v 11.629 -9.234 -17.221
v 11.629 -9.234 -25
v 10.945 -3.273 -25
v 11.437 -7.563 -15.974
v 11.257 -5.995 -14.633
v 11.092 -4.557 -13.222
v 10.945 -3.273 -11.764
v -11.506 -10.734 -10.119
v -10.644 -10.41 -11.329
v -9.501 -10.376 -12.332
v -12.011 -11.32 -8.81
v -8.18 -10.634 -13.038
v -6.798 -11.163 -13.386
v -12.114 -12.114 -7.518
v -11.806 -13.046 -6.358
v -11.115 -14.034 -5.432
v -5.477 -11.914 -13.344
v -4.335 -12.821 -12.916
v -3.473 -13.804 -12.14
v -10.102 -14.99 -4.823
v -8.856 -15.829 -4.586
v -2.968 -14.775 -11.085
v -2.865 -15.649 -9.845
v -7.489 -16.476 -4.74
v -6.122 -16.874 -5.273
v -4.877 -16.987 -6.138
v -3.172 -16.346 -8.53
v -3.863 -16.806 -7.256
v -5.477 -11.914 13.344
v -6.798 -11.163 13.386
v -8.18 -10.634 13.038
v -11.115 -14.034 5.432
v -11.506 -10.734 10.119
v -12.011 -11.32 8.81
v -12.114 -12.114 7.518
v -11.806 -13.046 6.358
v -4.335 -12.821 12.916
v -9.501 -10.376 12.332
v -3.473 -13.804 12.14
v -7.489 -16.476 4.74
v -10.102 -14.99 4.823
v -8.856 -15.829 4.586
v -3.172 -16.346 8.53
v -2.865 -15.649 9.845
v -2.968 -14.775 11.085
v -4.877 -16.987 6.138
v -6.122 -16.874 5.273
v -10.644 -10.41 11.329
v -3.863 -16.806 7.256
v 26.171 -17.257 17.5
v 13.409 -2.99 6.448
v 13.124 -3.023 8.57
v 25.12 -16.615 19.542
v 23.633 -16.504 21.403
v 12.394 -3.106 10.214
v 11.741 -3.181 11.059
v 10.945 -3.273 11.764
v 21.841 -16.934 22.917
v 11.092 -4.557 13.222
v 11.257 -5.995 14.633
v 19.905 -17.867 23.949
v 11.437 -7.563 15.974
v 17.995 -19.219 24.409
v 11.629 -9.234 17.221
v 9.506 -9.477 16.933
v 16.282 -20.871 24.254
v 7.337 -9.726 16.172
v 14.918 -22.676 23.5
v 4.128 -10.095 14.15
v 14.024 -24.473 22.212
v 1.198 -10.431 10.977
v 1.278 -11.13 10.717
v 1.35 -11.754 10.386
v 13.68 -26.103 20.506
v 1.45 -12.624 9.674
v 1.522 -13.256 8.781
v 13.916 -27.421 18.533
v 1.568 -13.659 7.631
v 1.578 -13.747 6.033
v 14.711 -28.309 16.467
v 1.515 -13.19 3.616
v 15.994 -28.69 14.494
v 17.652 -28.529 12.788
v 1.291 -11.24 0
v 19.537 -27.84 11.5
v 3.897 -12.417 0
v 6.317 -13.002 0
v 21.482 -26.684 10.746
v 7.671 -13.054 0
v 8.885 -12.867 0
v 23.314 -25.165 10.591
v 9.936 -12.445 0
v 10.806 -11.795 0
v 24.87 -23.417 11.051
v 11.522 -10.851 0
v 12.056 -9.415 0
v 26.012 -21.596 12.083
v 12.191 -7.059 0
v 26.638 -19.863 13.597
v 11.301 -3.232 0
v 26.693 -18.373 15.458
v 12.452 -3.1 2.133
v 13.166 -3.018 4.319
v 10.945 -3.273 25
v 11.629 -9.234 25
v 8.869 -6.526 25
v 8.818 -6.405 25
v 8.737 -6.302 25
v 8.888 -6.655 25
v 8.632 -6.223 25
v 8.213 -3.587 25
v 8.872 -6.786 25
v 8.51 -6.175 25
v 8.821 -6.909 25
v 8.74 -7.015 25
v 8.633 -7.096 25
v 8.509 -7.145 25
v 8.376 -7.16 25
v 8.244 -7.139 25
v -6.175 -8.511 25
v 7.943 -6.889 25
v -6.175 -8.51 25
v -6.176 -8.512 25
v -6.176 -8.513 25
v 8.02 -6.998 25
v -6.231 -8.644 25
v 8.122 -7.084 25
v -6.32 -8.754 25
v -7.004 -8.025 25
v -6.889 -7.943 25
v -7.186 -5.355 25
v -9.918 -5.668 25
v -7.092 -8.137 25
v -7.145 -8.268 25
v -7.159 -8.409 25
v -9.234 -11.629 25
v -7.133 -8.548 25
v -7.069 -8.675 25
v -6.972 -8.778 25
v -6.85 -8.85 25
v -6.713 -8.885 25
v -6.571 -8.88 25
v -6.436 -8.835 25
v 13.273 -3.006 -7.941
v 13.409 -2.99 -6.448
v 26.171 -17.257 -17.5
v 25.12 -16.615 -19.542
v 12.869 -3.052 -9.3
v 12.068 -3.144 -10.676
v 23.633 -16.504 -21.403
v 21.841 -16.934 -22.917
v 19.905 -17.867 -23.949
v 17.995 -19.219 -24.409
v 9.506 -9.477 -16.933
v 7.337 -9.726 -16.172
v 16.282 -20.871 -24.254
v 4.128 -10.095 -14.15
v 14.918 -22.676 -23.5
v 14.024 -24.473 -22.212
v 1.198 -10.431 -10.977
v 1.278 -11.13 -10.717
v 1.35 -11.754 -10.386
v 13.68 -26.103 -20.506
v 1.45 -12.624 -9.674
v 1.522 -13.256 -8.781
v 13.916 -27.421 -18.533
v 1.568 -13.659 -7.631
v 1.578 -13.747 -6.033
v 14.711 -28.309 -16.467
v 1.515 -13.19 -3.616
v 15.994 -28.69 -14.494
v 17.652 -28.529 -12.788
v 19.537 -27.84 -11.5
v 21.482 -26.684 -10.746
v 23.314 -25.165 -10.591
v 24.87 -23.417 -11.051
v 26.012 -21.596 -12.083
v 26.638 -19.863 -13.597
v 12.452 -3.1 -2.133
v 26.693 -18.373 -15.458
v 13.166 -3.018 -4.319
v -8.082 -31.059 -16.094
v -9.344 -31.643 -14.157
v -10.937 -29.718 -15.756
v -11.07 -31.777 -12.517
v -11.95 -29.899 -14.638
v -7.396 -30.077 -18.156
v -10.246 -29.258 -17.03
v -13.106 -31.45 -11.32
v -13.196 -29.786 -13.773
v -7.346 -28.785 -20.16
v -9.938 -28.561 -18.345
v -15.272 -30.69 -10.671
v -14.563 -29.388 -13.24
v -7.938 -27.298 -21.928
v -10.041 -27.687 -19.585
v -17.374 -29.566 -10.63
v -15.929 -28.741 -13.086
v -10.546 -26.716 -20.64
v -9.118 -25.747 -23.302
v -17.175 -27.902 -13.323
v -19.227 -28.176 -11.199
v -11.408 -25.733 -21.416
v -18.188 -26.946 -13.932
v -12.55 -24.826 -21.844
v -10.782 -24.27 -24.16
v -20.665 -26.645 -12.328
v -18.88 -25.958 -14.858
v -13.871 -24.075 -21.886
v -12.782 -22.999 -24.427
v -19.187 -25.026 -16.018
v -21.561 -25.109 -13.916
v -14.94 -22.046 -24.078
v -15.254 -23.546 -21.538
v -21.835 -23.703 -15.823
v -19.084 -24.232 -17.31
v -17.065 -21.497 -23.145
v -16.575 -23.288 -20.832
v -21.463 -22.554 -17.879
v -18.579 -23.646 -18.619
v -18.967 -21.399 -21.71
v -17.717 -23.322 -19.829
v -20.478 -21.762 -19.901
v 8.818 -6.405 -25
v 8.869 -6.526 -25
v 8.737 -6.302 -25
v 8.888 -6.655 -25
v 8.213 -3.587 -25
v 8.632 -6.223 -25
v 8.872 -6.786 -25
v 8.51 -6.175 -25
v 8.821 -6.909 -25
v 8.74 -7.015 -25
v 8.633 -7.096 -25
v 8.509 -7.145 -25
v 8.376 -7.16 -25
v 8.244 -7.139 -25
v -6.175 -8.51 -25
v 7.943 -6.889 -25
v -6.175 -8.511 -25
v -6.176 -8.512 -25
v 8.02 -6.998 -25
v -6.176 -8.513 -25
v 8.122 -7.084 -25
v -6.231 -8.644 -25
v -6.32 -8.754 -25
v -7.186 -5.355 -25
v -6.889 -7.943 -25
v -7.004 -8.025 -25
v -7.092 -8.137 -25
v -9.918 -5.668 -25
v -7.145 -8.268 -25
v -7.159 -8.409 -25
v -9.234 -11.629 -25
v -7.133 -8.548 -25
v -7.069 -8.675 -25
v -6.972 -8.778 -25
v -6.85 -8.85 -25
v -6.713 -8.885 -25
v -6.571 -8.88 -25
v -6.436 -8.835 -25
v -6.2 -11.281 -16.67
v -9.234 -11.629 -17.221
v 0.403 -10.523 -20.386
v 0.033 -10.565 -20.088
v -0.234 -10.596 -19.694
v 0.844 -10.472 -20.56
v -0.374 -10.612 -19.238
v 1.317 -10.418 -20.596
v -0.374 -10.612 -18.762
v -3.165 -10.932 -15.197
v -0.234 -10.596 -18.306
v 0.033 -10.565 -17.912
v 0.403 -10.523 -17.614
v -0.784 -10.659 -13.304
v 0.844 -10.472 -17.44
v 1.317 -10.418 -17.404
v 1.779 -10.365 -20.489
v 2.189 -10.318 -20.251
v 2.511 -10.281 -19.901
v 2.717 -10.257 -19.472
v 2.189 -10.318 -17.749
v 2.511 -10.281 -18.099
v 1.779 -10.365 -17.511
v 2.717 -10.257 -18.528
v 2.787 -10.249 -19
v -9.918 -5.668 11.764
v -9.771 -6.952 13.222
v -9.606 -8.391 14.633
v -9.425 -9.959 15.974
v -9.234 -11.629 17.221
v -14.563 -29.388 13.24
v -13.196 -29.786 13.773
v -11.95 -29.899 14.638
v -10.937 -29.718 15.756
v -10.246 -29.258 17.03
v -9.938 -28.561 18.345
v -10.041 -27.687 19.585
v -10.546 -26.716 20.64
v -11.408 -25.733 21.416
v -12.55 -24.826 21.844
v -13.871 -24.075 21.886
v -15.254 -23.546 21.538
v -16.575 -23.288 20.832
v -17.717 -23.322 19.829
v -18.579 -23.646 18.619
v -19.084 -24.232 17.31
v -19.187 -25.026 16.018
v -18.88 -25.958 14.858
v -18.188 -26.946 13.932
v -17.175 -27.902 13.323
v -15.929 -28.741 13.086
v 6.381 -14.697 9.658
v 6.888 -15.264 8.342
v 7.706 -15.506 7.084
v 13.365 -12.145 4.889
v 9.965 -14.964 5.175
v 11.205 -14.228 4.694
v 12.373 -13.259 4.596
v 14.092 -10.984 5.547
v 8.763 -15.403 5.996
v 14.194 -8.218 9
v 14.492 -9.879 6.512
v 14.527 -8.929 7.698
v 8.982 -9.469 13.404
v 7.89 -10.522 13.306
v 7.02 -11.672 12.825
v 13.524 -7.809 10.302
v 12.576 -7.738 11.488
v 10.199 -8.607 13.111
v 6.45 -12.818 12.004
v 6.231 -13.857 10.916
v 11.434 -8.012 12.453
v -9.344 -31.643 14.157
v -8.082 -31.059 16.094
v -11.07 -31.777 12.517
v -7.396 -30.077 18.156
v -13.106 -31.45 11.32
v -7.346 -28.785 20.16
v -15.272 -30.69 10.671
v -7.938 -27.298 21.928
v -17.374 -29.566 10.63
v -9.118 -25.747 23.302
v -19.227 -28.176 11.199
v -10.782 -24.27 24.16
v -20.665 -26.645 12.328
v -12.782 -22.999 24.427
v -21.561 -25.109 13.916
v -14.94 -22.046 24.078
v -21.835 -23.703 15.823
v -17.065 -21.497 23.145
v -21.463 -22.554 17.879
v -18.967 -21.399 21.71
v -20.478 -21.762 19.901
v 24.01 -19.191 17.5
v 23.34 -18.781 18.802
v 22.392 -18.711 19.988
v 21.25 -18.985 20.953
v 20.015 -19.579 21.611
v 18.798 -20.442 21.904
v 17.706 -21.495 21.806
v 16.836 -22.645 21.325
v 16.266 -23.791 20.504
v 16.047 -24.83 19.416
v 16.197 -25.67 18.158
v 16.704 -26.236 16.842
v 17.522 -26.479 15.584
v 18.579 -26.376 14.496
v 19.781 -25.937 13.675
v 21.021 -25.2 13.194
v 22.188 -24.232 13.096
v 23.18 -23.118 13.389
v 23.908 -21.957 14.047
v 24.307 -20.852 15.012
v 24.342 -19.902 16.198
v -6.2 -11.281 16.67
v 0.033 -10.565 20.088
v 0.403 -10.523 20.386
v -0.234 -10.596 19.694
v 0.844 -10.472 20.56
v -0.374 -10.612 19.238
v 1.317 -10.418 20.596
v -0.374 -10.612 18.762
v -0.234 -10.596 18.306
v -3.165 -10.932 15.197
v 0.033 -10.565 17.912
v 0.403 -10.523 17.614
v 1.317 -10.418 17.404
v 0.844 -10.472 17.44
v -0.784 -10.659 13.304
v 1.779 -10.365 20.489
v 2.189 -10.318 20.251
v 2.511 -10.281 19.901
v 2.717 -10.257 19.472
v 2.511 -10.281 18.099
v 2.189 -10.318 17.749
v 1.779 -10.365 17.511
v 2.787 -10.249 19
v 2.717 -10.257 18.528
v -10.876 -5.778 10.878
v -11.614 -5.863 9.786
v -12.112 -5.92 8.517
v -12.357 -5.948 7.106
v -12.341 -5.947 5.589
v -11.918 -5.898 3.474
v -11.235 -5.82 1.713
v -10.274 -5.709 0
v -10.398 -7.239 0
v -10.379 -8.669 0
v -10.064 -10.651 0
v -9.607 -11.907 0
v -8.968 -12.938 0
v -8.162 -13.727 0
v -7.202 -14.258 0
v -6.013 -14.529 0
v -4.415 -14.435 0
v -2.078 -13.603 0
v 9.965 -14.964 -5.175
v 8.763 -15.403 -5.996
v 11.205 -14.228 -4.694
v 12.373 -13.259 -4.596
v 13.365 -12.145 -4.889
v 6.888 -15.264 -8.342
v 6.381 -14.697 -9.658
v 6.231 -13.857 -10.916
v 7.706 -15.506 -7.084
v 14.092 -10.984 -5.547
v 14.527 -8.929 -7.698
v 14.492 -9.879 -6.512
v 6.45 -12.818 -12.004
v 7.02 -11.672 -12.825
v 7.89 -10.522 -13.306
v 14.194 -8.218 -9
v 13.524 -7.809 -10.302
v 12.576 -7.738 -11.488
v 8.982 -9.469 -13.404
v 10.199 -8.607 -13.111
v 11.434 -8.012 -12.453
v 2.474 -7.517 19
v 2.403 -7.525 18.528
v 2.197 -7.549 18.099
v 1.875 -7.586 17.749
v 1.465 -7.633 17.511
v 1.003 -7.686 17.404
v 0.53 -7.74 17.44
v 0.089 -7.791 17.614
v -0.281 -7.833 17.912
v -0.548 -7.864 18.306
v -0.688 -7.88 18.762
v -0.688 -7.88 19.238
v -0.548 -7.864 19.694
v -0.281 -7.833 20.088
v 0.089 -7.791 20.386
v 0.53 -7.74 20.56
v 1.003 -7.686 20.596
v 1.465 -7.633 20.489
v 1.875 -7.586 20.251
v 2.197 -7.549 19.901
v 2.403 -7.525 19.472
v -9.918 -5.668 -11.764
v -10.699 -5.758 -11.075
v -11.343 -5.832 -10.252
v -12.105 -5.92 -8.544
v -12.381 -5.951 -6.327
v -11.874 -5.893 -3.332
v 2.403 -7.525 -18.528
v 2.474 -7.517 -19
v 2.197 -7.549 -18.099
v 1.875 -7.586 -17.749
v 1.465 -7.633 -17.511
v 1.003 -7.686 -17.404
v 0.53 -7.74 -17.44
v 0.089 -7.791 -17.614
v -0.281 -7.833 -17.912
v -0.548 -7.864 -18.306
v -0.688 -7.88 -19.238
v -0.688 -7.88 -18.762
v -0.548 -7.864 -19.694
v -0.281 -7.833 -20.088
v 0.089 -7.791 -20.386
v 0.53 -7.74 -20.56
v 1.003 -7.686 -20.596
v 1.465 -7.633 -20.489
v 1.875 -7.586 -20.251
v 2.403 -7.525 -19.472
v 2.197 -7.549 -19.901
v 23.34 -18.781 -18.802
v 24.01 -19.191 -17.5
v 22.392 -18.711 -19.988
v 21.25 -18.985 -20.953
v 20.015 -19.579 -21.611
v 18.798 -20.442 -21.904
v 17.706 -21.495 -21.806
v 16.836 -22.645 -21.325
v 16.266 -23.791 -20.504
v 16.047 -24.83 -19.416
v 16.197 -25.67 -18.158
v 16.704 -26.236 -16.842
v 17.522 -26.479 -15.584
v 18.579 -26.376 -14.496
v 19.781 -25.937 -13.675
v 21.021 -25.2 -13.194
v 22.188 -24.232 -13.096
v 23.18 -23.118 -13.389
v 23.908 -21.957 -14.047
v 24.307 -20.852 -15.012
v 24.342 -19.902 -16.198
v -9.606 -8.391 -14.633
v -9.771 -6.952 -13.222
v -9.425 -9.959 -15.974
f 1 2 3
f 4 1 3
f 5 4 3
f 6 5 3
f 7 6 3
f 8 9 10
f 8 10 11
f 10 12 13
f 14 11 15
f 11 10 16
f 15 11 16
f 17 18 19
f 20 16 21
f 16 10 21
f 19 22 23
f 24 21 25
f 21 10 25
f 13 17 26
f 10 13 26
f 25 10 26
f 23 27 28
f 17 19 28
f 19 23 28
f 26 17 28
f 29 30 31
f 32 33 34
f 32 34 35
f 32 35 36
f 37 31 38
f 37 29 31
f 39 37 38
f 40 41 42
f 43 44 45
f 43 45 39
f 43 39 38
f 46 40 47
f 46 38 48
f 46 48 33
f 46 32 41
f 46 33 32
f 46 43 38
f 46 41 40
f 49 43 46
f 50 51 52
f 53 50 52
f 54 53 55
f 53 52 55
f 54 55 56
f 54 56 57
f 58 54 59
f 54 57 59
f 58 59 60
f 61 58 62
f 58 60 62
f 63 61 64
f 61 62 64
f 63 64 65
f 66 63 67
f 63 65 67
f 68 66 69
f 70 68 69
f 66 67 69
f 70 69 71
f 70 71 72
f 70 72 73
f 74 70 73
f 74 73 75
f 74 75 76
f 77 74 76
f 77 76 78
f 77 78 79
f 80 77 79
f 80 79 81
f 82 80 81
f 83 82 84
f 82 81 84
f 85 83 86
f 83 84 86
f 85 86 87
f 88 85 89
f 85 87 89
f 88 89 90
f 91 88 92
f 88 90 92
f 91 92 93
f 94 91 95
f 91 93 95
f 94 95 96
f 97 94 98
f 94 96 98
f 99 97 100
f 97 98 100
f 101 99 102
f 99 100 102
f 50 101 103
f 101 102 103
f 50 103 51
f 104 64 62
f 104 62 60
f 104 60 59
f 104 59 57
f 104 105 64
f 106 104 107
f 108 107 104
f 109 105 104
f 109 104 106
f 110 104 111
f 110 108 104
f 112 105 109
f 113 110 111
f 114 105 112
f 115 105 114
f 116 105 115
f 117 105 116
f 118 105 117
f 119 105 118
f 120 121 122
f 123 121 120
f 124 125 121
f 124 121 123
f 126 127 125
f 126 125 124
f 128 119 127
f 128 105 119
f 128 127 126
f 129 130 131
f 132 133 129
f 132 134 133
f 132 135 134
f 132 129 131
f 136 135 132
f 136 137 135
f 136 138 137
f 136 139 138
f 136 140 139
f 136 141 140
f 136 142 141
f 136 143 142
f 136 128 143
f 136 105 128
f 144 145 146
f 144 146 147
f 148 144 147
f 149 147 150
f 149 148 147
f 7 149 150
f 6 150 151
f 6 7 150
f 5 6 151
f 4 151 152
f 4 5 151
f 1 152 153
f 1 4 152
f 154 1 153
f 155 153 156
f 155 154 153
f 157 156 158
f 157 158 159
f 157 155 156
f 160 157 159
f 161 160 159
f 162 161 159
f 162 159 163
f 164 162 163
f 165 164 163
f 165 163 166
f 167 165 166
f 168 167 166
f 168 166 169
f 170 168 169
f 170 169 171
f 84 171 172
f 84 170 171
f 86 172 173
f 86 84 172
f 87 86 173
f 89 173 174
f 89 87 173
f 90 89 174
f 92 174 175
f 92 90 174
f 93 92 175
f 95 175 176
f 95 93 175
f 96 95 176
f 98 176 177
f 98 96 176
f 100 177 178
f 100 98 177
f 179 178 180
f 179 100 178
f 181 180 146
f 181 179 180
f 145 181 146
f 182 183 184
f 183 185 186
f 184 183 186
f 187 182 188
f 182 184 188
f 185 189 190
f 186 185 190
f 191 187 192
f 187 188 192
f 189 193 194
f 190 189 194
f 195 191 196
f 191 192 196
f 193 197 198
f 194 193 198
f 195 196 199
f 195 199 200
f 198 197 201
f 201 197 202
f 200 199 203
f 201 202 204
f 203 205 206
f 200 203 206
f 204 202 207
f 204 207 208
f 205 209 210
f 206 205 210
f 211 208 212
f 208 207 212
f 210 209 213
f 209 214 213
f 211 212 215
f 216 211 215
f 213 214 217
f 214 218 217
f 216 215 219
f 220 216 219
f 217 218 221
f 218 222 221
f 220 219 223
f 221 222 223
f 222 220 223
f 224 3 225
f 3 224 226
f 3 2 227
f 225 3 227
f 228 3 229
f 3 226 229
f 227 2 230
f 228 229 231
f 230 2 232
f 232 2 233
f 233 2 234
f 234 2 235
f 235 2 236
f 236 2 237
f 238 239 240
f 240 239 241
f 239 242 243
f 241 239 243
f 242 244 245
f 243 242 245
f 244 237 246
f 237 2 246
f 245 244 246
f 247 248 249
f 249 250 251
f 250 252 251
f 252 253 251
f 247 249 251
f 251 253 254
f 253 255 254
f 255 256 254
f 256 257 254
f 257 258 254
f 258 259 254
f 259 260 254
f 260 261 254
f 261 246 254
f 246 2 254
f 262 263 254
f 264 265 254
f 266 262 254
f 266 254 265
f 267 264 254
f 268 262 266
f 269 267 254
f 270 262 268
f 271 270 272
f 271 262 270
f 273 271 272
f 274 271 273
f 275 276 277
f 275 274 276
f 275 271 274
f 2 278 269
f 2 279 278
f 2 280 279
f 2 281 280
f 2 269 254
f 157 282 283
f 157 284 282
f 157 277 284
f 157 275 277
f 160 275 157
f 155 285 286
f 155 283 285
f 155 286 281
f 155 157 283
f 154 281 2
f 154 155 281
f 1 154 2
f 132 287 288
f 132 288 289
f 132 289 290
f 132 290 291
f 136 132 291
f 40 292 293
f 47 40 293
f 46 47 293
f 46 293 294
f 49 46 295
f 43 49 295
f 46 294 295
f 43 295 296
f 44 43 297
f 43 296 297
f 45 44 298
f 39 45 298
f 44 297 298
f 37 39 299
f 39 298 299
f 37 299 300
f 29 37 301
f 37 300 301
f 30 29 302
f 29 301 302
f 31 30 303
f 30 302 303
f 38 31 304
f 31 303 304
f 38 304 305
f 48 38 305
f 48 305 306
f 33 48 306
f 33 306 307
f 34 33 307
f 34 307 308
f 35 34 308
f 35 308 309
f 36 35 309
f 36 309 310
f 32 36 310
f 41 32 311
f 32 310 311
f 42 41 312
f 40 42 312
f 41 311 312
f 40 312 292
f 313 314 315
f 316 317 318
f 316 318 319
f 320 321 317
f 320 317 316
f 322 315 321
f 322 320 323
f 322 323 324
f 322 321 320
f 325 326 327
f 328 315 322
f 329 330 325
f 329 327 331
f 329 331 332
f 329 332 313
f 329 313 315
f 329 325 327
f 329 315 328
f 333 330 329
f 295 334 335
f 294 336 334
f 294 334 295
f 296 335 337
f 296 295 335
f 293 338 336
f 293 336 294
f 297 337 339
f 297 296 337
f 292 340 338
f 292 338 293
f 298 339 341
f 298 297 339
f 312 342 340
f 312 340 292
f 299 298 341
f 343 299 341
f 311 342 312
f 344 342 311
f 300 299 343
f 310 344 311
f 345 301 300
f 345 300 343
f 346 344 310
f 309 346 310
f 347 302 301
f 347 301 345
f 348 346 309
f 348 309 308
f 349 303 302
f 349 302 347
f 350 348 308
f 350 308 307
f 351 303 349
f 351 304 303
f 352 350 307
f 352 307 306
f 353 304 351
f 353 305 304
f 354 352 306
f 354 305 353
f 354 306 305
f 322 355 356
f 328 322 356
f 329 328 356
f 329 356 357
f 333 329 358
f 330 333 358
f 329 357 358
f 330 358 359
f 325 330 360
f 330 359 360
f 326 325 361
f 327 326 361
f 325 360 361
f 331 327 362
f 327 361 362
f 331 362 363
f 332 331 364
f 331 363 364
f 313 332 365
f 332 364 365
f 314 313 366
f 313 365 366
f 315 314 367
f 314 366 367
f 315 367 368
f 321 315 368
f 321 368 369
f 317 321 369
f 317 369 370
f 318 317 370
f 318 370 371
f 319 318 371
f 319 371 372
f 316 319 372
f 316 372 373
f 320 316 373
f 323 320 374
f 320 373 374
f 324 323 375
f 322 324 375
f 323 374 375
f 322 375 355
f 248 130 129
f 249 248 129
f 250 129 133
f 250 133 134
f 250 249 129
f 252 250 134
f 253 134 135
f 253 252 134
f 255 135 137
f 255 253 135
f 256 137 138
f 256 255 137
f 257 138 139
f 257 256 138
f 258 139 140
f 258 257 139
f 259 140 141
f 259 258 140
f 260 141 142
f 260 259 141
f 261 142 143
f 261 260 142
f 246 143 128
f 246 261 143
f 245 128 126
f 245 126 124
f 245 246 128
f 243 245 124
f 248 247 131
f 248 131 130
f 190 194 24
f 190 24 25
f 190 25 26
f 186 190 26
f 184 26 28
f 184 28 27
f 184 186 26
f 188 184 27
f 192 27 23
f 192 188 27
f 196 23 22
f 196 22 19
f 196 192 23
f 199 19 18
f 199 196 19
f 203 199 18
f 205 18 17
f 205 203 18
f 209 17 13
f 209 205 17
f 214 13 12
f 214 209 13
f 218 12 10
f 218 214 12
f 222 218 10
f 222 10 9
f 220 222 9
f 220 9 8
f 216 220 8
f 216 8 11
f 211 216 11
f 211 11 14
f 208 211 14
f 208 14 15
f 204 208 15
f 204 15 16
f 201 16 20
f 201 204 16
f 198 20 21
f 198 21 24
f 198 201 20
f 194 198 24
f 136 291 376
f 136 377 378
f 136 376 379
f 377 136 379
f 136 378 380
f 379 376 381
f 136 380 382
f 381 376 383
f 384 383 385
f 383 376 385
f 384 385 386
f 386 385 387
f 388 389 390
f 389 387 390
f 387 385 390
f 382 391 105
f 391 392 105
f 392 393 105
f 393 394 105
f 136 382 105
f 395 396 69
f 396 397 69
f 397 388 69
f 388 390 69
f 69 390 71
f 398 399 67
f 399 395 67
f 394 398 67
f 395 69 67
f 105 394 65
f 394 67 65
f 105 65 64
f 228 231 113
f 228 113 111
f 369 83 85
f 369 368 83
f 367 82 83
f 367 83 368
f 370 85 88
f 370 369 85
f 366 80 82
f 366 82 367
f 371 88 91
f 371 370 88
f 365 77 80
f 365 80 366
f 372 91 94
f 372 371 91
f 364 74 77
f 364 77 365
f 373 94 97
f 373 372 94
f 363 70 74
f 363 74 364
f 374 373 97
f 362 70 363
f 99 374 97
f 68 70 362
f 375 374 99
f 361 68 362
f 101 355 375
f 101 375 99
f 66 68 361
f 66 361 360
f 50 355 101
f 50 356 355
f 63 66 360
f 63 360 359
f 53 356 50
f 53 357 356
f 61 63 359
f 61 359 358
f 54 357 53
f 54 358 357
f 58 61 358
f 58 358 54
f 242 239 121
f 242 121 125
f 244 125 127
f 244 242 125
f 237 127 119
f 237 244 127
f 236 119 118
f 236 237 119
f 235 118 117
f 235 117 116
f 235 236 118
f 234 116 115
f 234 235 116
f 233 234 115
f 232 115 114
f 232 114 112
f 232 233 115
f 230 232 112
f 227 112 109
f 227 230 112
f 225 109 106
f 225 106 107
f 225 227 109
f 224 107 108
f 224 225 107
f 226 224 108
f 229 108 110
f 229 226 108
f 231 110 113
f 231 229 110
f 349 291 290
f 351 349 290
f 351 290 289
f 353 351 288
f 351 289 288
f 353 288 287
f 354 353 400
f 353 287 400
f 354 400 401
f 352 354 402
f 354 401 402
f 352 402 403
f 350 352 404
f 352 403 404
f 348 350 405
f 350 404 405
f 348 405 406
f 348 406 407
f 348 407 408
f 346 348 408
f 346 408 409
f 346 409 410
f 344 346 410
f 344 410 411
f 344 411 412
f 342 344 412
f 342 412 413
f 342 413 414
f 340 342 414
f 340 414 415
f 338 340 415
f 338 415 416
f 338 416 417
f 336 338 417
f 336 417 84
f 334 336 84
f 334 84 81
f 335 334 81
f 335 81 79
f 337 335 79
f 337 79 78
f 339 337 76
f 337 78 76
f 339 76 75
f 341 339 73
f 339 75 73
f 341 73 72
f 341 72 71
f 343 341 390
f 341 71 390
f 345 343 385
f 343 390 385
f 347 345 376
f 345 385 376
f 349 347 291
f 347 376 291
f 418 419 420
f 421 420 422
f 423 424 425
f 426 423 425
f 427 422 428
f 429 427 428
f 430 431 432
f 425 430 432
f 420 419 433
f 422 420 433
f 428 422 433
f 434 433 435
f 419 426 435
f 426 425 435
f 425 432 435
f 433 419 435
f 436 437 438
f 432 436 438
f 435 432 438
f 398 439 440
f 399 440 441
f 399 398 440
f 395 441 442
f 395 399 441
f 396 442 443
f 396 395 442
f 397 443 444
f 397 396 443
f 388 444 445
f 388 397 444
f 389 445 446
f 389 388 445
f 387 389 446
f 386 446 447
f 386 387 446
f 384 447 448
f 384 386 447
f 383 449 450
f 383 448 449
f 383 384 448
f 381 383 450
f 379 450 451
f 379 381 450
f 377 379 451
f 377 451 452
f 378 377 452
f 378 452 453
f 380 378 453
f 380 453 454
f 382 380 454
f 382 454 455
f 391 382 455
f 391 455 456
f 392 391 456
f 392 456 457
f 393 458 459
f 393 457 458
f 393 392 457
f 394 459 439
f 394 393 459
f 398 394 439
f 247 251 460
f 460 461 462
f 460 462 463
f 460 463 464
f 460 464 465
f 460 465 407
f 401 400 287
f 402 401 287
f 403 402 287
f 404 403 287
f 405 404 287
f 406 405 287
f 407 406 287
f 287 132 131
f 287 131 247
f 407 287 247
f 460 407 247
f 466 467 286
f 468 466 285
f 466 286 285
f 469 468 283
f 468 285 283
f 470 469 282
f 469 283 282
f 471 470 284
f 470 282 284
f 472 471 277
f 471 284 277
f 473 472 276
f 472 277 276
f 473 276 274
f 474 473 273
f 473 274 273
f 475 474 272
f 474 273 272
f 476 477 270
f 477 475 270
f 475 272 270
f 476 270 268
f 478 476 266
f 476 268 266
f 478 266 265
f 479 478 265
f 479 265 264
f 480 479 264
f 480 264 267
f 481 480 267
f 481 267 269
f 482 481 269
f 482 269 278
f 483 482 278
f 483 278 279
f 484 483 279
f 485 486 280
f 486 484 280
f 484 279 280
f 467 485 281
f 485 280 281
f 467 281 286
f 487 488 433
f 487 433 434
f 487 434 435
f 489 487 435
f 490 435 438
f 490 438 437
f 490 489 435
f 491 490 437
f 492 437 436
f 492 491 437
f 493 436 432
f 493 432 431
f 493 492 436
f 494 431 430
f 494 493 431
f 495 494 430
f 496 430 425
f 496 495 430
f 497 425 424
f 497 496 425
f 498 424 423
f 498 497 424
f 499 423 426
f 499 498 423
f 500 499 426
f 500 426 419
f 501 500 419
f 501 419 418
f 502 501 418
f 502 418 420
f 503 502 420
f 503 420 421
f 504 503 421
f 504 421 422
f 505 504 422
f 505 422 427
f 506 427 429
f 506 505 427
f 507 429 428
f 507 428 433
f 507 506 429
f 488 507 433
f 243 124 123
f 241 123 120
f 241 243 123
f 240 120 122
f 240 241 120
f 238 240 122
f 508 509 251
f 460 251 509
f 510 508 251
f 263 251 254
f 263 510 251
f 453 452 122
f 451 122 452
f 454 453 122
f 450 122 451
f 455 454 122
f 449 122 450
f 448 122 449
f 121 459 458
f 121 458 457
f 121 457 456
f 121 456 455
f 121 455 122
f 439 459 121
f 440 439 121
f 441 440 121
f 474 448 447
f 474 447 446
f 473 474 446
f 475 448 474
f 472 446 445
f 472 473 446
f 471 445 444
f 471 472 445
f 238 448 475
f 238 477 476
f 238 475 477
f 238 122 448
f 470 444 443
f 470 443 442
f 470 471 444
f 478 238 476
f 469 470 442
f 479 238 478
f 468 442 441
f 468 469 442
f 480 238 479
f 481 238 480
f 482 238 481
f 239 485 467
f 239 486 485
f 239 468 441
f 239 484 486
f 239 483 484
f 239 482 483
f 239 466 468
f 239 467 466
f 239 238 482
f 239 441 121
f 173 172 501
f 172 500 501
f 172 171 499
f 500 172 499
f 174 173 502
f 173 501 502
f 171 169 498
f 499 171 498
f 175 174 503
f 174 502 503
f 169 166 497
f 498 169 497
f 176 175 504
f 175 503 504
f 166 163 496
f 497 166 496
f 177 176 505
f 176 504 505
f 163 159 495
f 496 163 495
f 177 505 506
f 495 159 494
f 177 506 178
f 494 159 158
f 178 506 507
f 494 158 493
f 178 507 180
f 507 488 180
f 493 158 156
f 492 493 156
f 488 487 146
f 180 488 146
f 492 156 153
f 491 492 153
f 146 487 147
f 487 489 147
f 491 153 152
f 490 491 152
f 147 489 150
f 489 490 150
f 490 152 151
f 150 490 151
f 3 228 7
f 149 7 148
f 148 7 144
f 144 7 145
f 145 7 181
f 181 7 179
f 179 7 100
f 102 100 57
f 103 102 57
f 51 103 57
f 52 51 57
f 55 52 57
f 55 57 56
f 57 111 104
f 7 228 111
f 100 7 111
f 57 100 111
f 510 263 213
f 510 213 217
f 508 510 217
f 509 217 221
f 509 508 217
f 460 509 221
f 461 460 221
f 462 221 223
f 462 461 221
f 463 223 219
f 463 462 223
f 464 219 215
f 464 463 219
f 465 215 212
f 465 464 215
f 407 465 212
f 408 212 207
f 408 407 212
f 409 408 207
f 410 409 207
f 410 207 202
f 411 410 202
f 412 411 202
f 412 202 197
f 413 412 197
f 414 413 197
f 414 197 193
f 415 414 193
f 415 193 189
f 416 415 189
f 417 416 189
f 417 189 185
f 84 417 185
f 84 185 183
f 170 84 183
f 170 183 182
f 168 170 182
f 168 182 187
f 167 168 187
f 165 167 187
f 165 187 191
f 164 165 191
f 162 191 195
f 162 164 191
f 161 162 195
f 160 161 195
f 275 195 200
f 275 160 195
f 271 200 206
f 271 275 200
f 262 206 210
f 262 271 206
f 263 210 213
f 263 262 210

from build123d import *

# Parameters (mm, degrees)
BOSS_EXTRUDE1_DEPTH = 25
SKETCH5_R           = 8
BOSS_EXTRUDE2_DEPTH = 35
SKETCH6_R           = 8
BOSS_EXTRUDE3_DEPTH = 35
CUT_EXTRUDE1_DEPTH  = 35
SKETCH9_R           = 5.1
CUT_EXTRUDE2_DEPTH  = 17
SKETCH10_R          = 5.1
CUT_EXTRUDE3_DEPTH  = 17
SKETCH11_R          = 0.5
CUT_EXTRUDE4_DEPTH  = 49.48192396
CUT_EXTRUDE5_REACH  = 44.001
SKETCH12_R          = 1.6
CUT_EXTRUDE7_DEPTH  = 66.003822587


# Read off the part's stored shape, not the designer's step: Mirror1
with BuildPart() as part:
    # Sketch3 → Boss-Extrude1 (new body)
    with BuildSketch(Plane(origin=(0, 0, 0), x_dir=(-0.9678879191476432, 0.2513821313618881, 0), z_dir=(0, 0, 1))):
        Polygon((-6.013757892, -13.576992157), (13.576992157, -6.013757892), (6.013757892, 13.576992157), (-13.576992157, 6.013757892), align=None)
    extrude(amount=BOSS_EXTRUDE1_DEPTH)

    # Sketch5 → Boss-Extrude2 (add)
    with BuildSketch(Plane(origin=(0, 0, 0), x_dir=(-0.6605627762289513, -0.729230336843708, -0.17854952950795708), z_dir=(0.5774000057119382, -0.6454527352206789, 0.499999999999998))):
        with Locations(Location((0, 0, 0), (0, 0, 168.101929209))):
            Circle(SKETCH5_R)
    extrude(amount=BOSS_EXTRUDE2_DEPTH)

    # Sketch6 → Boss-Extrude3 (add)
    with BuildSketch(Plane(origin=(0, 0, 0), x_dir=(-0.7035639492311271, 0.6172392366079582, 0.3521554970945721), z_dir=(-0.4160720061092846, -0.7595288577349762, 0.499999999999998))):
        with Locations(Location((0, 0, 0), (0, 0, 312.286757046))):
            Circle(SKETCH6_R)
    extrude(amount=BOSS_EXTRUDE3_DEPTH)

    # Sketch8 → Cut-Extrude1 (cut)
    with BuildSketch(Plane(origin=(0, 0, 0), x_dir=(-0.9678879191476432, 0.2513821313618881, 0), z_dir=(0, 0, 1))):
        Polygon((-36.845563498, -70.986857451), (-76.079837432, 33.240527854), (43.363854901, 78.202670298), (82.598128835, -26.024715007), align=None)
    extrude(amount=-CUT_EXTRUDE1_DEPTH, mode=Mode.SUBTRACT)

    # Sketch9 → Cut-Extrude2 (cut)
    with BuildSketch(Plane(origin=(20.2090002, -22.590845733, 17.5), x_dir=(0.6605627762289512, 0.7292303368437081, 0.1785495295079571), z_dir=(0.5774000057119382, -0.6454527352206788, 0.499999999999998))):
        with Locations(Location((0, 0, 0), (0, 0, 348.101929209))):
            Circle(SKETCH9_R)
    extrude(amount=-CUT_EXTRUDE2_DEPTH, mode=Mode.SUBTRACT)

    # Sketch10 → Cut-Extrude3 (cut)
    with BuildSketch(Plane(origin=(-14.562520214, -26.583510021, 17.5), x_dir=(-0.7035639492311272, 0.6172392366079582, 0.352155497094572), z_dir=(-0.41607200610928446, -0.7595288577349761, 0.499999999999998))):
        with Locations(Location((0, 0, 0), (0, 0, 129.311285717))):
            Circle(SKETCH10_R)
    extrude(amount=-CUT_EXTRUDE3_DEPTH, mode=Mode.SUBTRACT)

    # Sketch11 → Cut-Extrude4 (cut, through all)
    with BuildSketch(Plane(origin=(0, 0, 25), x_dir=(0.967887919147643, -0.25138213136188803, 0), z_dir=(0, 0, 1))):
        with BuildLine():
            ThreePointArc((-3.837479182, -9.792532706), (-3.837482303, -9.790766245), (-3.837491664, -9.788999807))
            Line((-3.837491664, -9.788999807), (-4.438726063, -10.021113258))
            Line((-4.438726063, -10.021113258), (-4.670839514, -9.419878859))
            ThreePointArc((-4.670839514, -9.419878859), (-4.541586794, -10.248975564), (-3.837479182, -9.792532706))
        make_face()
        with BuildLine():
            Line((-4.438726063, -10.021113258), (-3.837491664, -9.788999807))
            ThreePointArc((-3.837491664, -9.788999807), (-4.134985421, -9.3353716), (-4.670839514, -9.419878859))
            Line((-4.670839514, -9.419878859), (-4.438726063, -10.021113258))
        make_face()
        with BuildLine():
            Line((9.419878859, -4.670839514), (10.021113258, -4.438726063))
            Line((10.021113258, -4.438726063), (9.788999807, -3.837491664))
            ThreePointArc((9.788999807, -3.837491664), (9.3353716, -4.134985421), (9.419878859, -4.670839514))
        make_face()
        with BuildLine():
            Line((9.788999807, -3.837491664), (10.021113258, -4.438726063))
            Line((10.021113258, -4.438726063), (9.419878859, -4.670839514))
            ThreePointArc((9.419878859, -4.670839514), (9.97096067, -4.804558899), (10.292532706, -4.337479182))
            ThreePointArc((10.292532706, -4.337479182), (10.144834814, -3.982678922), (9.788999807, -3.837491664))
        make_face()
        with Locations((-4.337479182, -9.792532706)):
            Circle(SKETCH11_R)
        with Locations((9.792532706, -4.337479182)):
            Circle(SKETCH11_R)
        Polygon((-4.438726063, -10.021113258), (10.021113258, -4.438726063), (4.438726063, 10.021113258), (-10.021113258, 4.438726063), align=None)
    extrude(amount=-CUT_EXTRUDE4_DEPTH, mode=Mode.SUBTRACT)

    # Sketch12 → Cut-Extrude5 (cut, up to next)
    with BuildSketch(Plane(origin=(1.197799286, -10.431456124, 0), x_dir=(0.07381782244775265, 0.008476183382208579, -0.9972357210832067), z_dir=(-0.11407612251429676, 0.9934720118212205, 0)), mode=Mode.PRIVATE) as cut_extrude5_sk1:
        with Locations(Location((-18.947478701, -1.411754543, 0), (0, 0, 274.261167974))):
            Circle(SKETCH12_R)
    cut_extrude5_tool1 = extrude(cut_extrude5_sk1.sketch, amount=CUT_EXTRUDE5_REACH, mode=Mode.PRIVATE) & part.part
    add(cut_extrude5_tool1.solids().sort_by_distance((1.197799, -10.431456, 19))[0], mode=Mode.SUBTRACT)

    # Mirror1: part across plane


with BuildPart() as part_1:
    add(part.part)
    add(part.part.mirror(Plane.XY))

    # Sketch14 → Cut-Extrude7 (cut, through all)
    with BuildSketch(Plane.XY.offset(25)):
        Polygon((-31.040805359, -8.093851281), (38.274007484, -0.134729143), (36.078976394, 18.981470679), (-33.745248602, 10.963854933), align=None)
    extrude(amount=-CUT_EXTRUDE7_DEPTH, mode=Mode.SUBTRACT)


solid = part_1.part
